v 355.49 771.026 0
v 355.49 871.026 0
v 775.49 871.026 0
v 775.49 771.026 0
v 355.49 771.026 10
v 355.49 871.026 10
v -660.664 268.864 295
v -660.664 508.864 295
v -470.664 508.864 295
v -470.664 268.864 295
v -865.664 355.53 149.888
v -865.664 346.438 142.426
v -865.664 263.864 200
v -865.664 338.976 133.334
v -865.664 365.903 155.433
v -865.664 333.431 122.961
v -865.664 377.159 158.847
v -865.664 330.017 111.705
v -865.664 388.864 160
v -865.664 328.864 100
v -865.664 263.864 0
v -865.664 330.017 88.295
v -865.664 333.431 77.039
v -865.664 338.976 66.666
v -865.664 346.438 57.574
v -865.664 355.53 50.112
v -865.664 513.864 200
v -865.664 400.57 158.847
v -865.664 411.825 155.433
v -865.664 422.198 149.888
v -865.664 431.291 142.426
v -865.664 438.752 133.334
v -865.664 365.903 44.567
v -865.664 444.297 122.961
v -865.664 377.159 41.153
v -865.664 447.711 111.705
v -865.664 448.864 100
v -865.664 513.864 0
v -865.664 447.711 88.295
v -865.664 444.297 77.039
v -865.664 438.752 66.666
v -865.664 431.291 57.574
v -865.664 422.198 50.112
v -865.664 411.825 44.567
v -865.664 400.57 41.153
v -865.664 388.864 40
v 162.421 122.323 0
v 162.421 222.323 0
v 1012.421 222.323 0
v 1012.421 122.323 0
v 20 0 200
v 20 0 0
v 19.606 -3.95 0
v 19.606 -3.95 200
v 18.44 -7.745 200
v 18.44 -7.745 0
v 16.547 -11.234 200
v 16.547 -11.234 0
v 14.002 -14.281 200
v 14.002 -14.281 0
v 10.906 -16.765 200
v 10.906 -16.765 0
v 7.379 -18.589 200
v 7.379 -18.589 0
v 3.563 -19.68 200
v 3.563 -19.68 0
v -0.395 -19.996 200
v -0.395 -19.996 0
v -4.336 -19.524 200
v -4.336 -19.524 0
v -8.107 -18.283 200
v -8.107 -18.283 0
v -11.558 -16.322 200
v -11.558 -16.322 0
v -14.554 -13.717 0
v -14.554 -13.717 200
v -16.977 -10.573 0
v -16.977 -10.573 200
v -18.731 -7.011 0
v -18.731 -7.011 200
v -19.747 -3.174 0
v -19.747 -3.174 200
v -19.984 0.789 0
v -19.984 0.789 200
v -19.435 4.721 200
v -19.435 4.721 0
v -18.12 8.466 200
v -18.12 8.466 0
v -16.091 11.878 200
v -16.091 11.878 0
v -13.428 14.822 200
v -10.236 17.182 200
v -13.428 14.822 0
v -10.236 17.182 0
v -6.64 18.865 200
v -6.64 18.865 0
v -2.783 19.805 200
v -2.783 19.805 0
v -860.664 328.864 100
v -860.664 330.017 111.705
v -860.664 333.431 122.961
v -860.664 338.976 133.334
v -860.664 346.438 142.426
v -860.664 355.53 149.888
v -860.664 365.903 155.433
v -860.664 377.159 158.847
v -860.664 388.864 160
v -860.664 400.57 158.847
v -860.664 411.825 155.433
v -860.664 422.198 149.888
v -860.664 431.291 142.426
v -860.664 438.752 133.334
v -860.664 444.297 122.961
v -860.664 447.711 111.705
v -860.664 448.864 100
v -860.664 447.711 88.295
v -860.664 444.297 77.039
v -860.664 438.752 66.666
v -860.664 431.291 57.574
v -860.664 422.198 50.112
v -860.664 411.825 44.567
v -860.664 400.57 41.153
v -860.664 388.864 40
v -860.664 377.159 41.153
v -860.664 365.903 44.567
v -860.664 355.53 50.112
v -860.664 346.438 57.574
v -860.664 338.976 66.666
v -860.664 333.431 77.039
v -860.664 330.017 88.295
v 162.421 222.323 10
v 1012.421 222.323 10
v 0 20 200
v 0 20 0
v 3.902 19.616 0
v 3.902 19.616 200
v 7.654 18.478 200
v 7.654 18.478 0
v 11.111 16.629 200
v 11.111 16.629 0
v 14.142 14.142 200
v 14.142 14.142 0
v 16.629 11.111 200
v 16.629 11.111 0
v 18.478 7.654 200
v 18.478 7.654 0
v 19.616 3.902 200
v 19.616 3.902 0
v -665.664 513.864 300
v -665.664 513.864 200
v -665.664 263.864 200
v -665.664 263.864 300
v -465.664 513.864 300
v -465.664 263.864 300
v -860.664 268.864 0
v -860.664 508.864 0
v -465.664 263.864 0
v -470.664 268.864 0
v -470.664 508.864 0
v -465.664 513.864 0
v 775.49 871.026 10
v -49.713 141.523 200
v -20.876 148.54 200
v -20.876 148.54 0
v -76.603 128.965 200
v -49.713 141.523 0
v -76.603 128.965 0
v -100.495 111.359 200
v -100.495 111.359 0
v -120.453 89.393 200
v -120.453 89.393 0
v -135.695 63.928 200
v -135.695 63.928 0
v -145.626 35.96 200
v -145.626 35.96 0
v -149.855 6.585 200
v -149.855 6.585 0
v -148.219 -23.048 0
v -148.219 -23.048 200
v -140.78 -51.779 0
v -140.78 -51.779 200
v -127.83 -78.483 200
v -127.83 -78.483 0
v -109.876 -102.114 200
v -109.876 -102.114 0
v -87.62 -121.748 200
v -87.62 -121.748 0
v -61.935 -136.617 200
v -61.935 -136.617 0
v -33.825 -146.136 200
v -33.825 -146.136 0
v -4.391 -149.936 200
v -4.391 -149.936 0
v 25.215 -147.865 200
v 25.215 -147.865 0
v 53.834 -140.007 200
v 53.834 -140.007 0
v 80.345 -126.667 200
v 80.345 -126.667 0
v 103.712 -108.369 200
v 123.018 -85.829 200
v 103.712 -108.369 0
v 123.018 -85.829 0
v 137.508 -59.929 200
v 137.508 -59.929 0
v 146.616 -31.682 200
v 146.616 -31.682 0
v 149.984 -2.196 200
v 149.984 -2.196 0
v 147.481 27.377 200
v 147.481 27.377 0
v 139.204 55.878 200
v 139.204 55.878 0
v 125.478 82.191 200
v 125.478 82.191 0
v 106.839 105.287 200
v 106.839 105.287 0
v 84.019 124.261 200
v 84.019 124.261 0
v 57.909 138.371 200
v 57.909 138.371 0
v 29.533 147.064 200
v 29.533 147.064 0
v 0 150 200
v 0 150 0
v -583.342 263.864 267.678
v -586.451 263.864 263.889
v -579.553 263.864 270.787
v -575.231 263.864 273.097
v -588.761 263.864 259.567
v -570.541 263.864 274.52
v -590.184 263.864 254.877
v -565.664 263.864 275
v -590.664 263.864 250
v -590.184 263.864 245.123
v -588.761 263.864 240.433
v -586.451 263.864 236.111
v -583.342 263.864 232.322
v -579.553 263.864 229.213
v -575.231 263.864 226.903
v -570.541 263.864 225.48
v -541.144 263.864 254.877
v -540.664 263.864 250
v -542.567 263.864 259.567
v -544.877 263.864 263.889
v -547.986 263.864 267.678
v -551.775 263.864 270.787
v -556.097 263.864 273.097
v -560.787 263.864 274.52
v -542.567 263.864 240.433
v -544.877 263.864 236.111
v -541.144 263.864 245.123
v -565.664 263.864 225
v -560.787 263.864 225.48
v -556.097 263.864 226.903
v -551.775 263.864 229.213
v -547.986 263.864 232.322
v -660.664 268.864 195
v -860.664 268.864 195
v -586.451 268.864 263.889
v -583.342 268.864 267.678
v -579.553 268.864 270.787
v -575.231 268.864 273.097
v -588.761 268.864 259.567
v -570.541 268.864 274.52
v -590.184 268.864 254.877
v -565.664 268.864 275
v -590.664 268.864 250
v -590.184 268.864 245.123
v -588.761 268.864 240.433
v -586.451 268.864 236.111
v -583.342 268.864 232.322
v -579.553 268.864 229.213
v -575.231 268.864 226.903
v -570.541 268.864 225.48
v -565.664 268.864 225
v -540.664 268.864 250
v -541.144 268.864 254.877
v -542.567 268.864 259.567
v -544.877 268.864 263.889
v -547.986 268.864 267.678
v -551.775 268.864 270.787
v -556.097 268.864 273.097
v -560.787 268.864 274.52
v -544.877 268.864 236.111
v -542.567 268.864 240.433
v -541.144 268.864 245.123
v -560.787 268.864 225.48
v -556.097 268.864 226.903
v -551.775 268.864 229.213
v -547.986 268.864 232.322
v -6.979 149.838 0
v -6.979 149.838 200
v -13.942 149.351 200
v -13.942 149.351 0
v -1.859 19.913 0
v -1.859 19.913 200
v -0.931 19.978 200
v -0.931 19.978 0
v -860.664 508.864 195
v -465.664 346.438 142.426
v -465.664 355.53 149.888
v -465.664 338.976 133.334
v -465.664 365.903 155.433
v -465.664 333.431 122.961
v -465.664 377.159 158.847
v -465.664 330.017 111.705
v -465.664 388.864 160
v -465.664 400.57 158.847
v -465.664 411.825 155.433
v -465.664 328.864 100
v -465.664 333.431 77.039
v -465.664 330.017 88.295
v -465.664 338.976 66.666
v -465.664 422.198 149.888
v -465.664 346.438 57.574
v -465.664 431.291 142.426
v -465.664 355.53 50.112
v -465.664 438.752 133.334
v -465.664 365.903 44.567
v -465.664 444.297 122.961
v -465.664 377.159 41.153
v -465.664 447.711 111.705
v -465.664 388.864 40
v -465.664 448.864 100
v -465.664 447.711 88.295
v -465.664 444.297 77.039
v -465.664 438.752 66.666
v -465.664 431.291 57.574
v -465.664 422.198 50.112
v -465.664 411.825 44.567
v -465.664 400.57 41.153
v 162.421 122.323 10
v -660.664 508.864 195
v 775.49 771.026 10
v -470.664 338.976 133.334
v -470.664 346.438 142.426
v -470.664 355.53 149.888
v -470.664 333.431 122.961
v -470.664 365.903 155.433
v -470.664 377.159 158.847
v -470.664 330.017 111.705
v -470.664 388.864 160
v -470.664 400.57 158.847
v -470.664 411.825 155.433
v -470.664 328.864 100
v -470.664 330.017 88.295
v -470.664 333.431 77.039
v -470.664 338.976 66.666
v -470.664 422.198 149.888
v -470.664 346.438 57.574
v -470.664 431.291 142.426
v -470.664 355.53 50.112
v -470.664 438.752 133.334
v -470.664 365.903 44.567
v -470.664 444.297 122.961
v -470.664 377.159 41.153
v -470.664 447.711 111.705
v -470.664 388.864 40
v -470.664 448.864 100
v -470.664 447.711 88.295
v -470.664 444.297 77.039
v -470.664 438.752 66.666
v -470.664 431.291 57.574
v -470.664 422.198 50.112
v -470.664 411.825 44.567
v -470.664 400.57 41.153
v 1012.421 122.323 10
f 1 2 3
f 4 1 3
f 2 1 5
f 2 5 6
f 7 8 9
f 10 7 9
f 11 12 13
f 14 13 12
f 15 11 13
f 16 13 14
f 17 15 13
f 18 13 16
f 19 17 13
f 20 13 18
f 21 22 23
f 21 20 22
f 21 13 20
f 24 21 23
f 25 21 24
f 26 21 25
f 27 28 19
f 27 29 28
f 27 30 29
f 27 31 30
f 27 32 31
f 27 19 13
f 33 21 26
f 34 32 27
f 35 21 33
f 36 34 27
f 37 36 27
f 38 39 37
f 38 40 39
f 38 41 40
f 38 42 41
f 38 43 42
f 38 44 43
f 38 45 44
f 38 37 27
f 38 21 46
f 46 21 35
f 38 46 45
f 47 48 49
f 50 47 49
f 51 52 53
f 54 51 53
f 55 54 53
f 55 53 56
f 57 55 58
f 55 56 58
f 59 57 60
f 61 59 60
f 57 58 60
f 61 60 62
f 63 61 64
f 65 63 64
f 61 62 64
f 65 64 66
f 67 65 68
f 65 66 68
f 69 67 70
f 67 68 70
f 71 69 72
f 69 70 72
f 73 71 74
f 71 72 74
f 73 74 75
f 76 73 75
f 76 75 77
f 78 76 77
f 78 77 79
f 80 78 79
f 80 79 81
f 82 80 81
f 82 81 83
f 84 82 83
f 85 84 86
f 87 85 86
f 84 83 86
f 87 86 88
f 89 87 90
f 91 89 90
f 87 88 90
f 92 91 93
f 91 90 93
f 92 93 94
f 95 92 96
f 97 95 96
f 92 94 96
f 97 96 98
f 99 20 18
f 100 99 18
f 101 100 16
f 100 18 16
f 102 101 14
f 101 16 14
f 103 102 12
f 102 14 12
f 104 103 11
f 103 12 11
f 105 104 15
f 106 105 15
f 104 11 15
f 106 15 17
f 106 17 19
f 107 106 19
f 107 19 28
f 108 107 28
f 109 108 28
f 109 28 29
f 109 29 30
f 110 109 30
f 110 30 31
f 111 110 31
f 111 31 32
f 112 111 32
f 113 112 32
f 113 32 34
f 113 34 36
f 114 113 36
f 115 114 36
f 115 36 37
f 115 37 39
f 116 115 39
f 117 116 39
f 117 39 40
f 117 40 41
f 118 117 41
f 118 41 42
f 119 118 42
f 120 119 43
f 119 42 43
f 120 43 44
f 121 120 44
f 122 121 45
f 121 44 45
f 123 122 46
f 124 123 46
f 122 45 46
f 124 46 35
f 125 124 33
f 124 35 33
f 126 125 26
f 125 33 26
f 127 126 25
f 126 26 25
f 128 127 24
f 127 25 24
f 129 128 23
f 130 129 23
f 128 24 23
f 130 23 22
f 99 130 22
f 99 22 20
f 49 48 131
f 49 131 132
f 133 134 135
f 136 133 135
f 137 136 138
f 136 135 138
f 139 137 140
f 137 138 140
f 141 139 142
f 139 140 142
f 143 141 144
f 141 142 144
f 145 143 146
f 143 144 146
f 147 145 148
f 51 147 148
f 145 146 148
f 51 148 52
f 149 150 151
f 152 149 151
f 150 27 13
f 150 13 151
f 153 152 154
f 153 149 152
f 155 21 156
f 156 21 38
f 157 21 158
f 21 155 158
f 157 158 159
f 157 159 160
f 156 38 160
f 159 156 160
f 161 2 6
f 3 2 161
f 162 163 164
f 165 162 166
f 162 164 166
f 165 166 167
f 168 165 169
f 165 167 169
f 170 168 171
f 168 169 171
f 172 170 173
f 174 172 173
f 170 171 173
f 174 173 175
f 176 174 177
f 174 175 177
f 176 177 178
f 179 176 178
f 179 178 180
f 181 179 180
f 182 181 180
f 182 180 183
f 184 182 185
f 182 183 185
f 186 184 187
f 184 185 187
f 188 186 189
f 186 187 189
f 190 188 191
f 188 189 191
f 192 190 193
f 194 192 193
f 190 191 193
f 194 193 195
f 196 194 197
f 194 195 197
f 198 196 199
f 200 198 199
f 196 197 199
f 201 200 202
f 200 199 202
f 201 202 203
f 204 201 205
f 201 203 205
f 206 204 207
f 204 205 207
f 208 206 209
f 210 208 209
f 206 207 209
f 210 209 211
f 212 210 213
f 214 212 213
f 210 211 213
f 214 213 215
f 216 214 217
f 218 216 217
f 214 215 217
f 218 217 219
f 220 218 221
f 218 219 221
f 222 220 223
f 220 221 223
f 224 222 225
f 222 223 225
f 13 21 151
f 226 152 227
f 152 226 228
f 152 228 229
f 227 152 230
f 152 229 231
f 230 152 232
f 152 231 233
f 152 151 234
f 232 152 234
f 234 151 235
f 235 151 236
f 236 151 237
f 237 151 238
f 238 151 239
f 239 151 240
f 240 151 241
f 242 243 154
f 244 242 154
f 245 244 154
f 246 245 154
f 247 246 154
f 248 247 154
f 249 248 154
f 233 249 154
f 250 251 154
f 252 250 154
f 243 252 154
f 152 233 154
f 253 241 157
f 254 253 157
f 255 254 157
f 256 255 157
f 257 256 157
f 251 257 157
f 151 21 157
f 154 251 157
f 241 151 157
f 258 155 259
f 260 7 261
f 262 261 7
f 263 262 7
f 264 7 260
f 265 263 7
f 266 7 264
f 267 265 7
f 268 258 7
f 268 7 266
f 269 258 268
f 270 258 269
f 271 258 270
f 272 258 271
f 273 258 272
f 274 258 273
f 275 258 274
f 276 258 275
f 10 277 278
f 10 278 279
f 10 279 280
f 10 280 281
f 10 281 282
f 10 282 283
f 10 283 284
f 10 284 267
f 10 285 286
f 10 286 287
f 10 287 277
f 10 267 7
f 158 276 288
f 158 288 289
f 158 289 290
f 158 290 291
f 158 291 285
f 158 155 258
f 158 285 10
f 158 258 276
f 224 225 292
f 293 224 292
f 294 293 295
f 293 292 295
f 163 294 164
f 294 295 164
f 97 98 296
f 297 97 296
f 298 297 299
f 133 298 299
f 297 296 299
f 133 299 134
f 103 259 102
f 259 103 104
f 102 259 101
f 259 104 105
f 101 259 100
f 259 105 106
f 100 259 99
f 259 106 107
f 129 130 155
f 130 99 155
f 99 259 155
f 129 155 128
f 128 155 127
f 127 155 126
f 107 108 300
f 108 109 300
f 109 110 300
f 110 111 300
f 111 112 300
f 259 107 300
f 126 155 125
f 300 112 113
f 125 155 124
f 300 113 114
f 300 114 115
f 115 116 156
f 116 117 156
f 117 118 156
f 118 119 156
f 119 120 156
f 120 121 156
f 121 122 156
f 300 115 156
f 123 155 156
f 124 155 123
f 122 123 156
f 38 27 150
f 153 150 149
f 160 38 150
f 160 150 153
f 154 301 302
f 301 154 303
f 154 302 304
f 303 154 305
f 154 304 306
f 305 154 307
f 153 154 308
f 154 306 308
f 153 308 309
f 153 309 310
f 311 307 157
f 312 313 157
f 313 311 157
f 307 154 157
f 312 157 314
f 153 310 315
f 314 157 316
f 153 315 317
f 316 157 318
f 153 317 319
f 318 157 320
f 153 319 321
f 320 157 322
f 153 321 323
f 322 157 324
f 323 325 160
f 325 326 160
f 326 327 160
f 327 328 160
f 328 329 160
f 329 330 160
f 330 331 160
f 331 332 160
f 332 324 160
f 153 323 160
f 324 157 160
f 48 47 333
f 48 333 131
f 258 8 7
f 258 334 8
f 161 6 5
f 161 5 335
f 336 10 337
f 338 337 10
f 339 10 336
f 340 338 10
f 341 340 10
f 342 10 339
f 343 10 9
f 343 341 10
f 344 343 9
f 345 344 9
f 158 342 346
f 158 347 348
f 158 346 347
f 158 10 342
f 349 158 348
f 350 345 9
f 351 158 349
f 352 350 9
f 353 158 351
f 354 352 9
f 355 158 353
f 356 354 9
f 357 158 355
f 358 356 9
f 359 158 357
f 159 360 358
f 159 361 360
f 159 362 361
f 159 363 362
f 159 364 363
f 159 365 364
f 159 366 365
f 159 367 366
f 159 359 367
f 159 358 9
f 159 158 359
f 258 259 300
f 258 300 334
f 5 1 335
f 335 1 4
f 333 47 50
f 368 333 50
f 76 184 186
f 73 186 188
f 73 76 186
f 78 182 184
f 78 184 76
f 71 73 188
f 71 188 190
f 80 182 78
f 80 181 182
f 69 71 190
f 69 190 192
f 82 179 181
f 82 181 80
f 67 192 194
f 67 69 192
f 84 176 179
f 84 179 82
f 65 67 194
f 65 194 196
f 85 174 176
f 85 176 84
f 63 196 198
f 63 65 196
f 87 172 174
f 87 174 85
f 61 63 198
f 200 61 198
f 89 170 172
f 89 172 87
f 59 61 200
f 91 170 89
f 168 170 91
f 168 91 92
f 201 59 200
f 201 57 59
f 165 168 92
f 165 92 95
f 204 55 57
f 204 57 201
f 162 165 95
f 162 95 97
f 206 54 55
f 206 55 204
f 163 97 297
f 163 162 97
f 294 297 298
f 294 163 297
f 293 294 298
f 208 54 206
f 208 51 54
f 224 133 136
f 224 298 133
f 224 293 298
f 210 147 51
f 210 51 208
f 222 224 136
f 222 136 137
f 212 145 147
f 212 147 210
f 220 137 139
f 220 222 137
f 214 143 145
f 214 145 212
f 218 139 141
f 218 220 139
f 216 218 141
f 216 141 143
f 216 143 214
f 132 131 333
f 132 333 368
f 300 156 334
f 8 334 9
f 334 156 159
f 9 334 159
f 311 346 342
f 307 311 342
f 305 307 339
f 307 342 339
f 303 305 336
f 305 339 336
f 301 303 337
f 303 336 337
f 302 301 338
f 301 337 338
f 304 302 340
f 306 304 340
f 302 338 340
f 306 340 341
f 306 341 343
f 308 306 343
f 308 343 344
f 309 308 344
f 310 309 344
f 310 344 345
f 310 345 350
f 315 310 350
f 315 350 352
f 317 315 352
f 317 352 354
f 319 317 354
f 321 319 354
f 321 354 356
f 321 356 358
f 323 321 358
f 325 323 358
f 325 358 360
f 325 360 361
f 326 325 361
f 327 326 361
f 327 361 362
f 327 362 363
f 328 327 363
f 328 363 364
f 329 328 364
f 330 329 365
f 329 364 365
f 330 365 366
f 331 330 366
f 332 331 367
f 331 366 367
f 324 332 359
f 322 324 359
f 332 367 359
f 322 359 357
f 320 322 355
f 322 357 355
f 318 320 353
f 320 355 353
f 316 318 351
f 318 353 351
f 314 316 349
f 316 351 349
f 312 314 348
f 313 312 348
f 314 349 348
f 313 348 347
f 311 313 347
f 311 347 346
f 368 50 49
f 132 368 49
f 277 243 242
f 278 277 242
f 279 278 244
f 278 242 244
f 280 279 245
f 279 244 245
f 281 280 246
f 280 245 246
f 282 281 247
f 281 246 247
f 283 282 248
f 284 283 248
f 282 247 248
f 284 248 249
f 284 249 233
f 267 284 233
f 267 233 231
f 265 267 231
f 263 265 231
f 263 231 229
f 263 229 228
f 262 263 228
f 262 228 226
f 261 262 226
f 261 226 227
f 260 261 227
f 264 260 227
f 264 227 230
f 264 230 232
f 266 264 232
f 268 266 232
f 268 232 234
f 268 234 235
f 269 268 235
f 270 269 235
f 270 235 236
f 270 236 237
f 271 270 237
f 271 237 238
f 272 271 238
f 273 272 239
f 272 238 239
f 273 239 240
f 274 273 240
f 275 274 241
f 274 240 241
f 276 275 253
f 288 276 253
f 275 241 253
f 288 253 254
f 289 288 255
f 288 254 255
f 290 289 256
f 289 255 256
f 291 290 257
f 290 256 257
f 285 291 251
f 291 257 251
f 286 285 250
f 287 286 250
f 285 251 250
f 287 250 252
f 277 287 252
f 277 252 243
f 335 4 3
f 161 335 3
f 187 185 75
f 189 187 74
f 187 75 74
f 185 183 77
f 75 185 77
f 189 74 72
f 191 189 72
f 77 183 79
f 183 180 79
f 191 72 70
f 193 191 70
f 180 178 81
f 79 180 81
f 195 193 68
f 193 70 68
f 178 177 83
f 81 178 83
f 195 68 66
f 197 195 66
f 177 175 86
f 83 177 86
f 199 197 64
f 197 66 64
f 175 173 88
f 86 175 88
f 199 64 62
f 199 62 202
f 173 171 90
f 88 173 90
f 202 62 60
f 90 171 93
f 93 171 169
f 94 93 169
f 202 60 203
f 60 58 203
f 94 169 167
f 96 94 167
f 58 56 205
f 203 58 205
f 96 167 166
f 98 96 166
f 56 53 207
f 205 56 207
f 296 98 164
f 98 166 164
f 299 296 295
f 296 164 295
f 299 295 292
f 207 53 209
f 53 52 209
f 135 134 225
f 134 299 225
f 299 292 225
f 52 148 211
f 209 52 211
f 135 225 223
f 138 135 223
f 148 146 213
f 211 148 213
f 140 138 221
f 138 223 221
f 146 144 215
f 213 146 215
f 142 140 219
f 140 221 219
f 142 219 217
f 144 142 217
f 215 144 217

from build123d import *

# Parameters (mm, degrees)
F1_DEPTH  = 200
F2_W      = 850
F2_H      = 100
F3_DEPTH  = 10
F5_W      = 400
F5_H      = 250
F6_DEPTH  = 200
F7_W      = 200
F7_H      = 125
F8_DEPTH  = 100
F10_T     = -5
F9_R      = 60
F11_DEPTH = 1878.0857579241
F12_R     = 25
F13_DEPTH = 25
F14_W     = 420
F14_H     = 100
F15_DEPTH = 10


with BuildPart() as f1:
    # F0 (on Top) → F1 (new body)
    with BuildSketch(Plane.XY):
        with BuildLine():
            ThreePointArc((-20.875965144, 148.5402103112), (-98.4088543486, -113.2064370334), (150, 0))
            ThreePointArc((150, 0), (106.066017178, 106.066017178), (0, 150))
            Line((0, 150), (0, 20))
            ThreePointArc((0, 20), (14.1421356237, 14.1421356237), (20, 0))
            ThreePointArc((20, 0), (-13.1211805798, -15.0941916045), (-2.7834620192, 19.8053613748))
            Line((-2.7834620192, 19.8053613748), (-20.875965144, 148.5402103112))
        make_face()
        with BuildLine():
            Line((0, 20), (0, 150))
            ThreePointArc((0, 150), (-10.4634710616, 149.634607539), (-20.875965144, 148.5402103112))
            Line((-20.875965144, 148.5402103112), (-2.7834620192, 19.8053613748))
            ThreePointArc((-2.7834620192, 19.8053613748), (-1.3951294749, 19.9512810052), (0, 20))
        make_face()
    extrude(amount=F1_DEPTH)


with BuildPart() as f3:
    # F2 (on Top) → F3 (new body)
    with BuildSketch(Plane.XY):
        with Locations((587.4208122492, 172.323012268)):
            Rectangle(F2_W, F2_H)
    extrude(amount=F3_DEPTH)


with BuildPart() as f6:
    # F5 (on Top) → F6 (new body)
    with BuildSketch(Plane.XY):
        with Locations((-665.6639456749, 388.864159584)):
            Rectangle(F5_W, F5_H)
    extrude(amount=F6_DEPTH)

    # F7 (on face) → F8 (join)
    with BuildSketch(Plane.XY.offset(200)):
        with Locations((-565.6639456749, 326.364159584)):
            Rectangle(F7_W, F7_H)
        with Locations((-565.6639456749, 451.364159584)):
            Rectangle(F7_W, F7_H)
    extrude(amount=F8_DEPTH)

    # F10
    f10_openings = [f6.faces().sort_by_distance(p)[0] for p in [
        (-665.663946, 388.86416, 0),
    ]]
    offset(amount=F10_T, openings=f10_openings, kind=Kind.INTERSECTION)

    # F9 (on face) → F11 (cut, through all)
    with BuildSketch(Plane(origin=(-865.6639456749, 0, 0), x_dir=(0, -1, 0), z_dir=(-1, 0, 0))):
        with Locations((-388.864159584, 100)):
            Circle(F9_R)
    extrude(amount=-F11_DEPTH, mode=Mode.SUBTRACT)

    # F12 (on face) → F13 (cut)
    with BuildSketch(Plane.XZ.offset(-263.864159584)):
        with Locations((-565.6639456749, 250)):
            Circle(F12_R)
    extrude(amount=-F13_DEPTH, mode=Mode.SUBTRACT)


with BuildPart() as f15:
    # F14 (on Top) → F15 (new body)
    with BuildSketch(Plane.XY):
        with Locations((565.4901950922, 821.0257589817)):
            Rectangle(F14_W, F14_H)
    extrude(amount=F15_DEPTH)


solid = Compound([f1.part, f3.part, f6.part, f15.part])
